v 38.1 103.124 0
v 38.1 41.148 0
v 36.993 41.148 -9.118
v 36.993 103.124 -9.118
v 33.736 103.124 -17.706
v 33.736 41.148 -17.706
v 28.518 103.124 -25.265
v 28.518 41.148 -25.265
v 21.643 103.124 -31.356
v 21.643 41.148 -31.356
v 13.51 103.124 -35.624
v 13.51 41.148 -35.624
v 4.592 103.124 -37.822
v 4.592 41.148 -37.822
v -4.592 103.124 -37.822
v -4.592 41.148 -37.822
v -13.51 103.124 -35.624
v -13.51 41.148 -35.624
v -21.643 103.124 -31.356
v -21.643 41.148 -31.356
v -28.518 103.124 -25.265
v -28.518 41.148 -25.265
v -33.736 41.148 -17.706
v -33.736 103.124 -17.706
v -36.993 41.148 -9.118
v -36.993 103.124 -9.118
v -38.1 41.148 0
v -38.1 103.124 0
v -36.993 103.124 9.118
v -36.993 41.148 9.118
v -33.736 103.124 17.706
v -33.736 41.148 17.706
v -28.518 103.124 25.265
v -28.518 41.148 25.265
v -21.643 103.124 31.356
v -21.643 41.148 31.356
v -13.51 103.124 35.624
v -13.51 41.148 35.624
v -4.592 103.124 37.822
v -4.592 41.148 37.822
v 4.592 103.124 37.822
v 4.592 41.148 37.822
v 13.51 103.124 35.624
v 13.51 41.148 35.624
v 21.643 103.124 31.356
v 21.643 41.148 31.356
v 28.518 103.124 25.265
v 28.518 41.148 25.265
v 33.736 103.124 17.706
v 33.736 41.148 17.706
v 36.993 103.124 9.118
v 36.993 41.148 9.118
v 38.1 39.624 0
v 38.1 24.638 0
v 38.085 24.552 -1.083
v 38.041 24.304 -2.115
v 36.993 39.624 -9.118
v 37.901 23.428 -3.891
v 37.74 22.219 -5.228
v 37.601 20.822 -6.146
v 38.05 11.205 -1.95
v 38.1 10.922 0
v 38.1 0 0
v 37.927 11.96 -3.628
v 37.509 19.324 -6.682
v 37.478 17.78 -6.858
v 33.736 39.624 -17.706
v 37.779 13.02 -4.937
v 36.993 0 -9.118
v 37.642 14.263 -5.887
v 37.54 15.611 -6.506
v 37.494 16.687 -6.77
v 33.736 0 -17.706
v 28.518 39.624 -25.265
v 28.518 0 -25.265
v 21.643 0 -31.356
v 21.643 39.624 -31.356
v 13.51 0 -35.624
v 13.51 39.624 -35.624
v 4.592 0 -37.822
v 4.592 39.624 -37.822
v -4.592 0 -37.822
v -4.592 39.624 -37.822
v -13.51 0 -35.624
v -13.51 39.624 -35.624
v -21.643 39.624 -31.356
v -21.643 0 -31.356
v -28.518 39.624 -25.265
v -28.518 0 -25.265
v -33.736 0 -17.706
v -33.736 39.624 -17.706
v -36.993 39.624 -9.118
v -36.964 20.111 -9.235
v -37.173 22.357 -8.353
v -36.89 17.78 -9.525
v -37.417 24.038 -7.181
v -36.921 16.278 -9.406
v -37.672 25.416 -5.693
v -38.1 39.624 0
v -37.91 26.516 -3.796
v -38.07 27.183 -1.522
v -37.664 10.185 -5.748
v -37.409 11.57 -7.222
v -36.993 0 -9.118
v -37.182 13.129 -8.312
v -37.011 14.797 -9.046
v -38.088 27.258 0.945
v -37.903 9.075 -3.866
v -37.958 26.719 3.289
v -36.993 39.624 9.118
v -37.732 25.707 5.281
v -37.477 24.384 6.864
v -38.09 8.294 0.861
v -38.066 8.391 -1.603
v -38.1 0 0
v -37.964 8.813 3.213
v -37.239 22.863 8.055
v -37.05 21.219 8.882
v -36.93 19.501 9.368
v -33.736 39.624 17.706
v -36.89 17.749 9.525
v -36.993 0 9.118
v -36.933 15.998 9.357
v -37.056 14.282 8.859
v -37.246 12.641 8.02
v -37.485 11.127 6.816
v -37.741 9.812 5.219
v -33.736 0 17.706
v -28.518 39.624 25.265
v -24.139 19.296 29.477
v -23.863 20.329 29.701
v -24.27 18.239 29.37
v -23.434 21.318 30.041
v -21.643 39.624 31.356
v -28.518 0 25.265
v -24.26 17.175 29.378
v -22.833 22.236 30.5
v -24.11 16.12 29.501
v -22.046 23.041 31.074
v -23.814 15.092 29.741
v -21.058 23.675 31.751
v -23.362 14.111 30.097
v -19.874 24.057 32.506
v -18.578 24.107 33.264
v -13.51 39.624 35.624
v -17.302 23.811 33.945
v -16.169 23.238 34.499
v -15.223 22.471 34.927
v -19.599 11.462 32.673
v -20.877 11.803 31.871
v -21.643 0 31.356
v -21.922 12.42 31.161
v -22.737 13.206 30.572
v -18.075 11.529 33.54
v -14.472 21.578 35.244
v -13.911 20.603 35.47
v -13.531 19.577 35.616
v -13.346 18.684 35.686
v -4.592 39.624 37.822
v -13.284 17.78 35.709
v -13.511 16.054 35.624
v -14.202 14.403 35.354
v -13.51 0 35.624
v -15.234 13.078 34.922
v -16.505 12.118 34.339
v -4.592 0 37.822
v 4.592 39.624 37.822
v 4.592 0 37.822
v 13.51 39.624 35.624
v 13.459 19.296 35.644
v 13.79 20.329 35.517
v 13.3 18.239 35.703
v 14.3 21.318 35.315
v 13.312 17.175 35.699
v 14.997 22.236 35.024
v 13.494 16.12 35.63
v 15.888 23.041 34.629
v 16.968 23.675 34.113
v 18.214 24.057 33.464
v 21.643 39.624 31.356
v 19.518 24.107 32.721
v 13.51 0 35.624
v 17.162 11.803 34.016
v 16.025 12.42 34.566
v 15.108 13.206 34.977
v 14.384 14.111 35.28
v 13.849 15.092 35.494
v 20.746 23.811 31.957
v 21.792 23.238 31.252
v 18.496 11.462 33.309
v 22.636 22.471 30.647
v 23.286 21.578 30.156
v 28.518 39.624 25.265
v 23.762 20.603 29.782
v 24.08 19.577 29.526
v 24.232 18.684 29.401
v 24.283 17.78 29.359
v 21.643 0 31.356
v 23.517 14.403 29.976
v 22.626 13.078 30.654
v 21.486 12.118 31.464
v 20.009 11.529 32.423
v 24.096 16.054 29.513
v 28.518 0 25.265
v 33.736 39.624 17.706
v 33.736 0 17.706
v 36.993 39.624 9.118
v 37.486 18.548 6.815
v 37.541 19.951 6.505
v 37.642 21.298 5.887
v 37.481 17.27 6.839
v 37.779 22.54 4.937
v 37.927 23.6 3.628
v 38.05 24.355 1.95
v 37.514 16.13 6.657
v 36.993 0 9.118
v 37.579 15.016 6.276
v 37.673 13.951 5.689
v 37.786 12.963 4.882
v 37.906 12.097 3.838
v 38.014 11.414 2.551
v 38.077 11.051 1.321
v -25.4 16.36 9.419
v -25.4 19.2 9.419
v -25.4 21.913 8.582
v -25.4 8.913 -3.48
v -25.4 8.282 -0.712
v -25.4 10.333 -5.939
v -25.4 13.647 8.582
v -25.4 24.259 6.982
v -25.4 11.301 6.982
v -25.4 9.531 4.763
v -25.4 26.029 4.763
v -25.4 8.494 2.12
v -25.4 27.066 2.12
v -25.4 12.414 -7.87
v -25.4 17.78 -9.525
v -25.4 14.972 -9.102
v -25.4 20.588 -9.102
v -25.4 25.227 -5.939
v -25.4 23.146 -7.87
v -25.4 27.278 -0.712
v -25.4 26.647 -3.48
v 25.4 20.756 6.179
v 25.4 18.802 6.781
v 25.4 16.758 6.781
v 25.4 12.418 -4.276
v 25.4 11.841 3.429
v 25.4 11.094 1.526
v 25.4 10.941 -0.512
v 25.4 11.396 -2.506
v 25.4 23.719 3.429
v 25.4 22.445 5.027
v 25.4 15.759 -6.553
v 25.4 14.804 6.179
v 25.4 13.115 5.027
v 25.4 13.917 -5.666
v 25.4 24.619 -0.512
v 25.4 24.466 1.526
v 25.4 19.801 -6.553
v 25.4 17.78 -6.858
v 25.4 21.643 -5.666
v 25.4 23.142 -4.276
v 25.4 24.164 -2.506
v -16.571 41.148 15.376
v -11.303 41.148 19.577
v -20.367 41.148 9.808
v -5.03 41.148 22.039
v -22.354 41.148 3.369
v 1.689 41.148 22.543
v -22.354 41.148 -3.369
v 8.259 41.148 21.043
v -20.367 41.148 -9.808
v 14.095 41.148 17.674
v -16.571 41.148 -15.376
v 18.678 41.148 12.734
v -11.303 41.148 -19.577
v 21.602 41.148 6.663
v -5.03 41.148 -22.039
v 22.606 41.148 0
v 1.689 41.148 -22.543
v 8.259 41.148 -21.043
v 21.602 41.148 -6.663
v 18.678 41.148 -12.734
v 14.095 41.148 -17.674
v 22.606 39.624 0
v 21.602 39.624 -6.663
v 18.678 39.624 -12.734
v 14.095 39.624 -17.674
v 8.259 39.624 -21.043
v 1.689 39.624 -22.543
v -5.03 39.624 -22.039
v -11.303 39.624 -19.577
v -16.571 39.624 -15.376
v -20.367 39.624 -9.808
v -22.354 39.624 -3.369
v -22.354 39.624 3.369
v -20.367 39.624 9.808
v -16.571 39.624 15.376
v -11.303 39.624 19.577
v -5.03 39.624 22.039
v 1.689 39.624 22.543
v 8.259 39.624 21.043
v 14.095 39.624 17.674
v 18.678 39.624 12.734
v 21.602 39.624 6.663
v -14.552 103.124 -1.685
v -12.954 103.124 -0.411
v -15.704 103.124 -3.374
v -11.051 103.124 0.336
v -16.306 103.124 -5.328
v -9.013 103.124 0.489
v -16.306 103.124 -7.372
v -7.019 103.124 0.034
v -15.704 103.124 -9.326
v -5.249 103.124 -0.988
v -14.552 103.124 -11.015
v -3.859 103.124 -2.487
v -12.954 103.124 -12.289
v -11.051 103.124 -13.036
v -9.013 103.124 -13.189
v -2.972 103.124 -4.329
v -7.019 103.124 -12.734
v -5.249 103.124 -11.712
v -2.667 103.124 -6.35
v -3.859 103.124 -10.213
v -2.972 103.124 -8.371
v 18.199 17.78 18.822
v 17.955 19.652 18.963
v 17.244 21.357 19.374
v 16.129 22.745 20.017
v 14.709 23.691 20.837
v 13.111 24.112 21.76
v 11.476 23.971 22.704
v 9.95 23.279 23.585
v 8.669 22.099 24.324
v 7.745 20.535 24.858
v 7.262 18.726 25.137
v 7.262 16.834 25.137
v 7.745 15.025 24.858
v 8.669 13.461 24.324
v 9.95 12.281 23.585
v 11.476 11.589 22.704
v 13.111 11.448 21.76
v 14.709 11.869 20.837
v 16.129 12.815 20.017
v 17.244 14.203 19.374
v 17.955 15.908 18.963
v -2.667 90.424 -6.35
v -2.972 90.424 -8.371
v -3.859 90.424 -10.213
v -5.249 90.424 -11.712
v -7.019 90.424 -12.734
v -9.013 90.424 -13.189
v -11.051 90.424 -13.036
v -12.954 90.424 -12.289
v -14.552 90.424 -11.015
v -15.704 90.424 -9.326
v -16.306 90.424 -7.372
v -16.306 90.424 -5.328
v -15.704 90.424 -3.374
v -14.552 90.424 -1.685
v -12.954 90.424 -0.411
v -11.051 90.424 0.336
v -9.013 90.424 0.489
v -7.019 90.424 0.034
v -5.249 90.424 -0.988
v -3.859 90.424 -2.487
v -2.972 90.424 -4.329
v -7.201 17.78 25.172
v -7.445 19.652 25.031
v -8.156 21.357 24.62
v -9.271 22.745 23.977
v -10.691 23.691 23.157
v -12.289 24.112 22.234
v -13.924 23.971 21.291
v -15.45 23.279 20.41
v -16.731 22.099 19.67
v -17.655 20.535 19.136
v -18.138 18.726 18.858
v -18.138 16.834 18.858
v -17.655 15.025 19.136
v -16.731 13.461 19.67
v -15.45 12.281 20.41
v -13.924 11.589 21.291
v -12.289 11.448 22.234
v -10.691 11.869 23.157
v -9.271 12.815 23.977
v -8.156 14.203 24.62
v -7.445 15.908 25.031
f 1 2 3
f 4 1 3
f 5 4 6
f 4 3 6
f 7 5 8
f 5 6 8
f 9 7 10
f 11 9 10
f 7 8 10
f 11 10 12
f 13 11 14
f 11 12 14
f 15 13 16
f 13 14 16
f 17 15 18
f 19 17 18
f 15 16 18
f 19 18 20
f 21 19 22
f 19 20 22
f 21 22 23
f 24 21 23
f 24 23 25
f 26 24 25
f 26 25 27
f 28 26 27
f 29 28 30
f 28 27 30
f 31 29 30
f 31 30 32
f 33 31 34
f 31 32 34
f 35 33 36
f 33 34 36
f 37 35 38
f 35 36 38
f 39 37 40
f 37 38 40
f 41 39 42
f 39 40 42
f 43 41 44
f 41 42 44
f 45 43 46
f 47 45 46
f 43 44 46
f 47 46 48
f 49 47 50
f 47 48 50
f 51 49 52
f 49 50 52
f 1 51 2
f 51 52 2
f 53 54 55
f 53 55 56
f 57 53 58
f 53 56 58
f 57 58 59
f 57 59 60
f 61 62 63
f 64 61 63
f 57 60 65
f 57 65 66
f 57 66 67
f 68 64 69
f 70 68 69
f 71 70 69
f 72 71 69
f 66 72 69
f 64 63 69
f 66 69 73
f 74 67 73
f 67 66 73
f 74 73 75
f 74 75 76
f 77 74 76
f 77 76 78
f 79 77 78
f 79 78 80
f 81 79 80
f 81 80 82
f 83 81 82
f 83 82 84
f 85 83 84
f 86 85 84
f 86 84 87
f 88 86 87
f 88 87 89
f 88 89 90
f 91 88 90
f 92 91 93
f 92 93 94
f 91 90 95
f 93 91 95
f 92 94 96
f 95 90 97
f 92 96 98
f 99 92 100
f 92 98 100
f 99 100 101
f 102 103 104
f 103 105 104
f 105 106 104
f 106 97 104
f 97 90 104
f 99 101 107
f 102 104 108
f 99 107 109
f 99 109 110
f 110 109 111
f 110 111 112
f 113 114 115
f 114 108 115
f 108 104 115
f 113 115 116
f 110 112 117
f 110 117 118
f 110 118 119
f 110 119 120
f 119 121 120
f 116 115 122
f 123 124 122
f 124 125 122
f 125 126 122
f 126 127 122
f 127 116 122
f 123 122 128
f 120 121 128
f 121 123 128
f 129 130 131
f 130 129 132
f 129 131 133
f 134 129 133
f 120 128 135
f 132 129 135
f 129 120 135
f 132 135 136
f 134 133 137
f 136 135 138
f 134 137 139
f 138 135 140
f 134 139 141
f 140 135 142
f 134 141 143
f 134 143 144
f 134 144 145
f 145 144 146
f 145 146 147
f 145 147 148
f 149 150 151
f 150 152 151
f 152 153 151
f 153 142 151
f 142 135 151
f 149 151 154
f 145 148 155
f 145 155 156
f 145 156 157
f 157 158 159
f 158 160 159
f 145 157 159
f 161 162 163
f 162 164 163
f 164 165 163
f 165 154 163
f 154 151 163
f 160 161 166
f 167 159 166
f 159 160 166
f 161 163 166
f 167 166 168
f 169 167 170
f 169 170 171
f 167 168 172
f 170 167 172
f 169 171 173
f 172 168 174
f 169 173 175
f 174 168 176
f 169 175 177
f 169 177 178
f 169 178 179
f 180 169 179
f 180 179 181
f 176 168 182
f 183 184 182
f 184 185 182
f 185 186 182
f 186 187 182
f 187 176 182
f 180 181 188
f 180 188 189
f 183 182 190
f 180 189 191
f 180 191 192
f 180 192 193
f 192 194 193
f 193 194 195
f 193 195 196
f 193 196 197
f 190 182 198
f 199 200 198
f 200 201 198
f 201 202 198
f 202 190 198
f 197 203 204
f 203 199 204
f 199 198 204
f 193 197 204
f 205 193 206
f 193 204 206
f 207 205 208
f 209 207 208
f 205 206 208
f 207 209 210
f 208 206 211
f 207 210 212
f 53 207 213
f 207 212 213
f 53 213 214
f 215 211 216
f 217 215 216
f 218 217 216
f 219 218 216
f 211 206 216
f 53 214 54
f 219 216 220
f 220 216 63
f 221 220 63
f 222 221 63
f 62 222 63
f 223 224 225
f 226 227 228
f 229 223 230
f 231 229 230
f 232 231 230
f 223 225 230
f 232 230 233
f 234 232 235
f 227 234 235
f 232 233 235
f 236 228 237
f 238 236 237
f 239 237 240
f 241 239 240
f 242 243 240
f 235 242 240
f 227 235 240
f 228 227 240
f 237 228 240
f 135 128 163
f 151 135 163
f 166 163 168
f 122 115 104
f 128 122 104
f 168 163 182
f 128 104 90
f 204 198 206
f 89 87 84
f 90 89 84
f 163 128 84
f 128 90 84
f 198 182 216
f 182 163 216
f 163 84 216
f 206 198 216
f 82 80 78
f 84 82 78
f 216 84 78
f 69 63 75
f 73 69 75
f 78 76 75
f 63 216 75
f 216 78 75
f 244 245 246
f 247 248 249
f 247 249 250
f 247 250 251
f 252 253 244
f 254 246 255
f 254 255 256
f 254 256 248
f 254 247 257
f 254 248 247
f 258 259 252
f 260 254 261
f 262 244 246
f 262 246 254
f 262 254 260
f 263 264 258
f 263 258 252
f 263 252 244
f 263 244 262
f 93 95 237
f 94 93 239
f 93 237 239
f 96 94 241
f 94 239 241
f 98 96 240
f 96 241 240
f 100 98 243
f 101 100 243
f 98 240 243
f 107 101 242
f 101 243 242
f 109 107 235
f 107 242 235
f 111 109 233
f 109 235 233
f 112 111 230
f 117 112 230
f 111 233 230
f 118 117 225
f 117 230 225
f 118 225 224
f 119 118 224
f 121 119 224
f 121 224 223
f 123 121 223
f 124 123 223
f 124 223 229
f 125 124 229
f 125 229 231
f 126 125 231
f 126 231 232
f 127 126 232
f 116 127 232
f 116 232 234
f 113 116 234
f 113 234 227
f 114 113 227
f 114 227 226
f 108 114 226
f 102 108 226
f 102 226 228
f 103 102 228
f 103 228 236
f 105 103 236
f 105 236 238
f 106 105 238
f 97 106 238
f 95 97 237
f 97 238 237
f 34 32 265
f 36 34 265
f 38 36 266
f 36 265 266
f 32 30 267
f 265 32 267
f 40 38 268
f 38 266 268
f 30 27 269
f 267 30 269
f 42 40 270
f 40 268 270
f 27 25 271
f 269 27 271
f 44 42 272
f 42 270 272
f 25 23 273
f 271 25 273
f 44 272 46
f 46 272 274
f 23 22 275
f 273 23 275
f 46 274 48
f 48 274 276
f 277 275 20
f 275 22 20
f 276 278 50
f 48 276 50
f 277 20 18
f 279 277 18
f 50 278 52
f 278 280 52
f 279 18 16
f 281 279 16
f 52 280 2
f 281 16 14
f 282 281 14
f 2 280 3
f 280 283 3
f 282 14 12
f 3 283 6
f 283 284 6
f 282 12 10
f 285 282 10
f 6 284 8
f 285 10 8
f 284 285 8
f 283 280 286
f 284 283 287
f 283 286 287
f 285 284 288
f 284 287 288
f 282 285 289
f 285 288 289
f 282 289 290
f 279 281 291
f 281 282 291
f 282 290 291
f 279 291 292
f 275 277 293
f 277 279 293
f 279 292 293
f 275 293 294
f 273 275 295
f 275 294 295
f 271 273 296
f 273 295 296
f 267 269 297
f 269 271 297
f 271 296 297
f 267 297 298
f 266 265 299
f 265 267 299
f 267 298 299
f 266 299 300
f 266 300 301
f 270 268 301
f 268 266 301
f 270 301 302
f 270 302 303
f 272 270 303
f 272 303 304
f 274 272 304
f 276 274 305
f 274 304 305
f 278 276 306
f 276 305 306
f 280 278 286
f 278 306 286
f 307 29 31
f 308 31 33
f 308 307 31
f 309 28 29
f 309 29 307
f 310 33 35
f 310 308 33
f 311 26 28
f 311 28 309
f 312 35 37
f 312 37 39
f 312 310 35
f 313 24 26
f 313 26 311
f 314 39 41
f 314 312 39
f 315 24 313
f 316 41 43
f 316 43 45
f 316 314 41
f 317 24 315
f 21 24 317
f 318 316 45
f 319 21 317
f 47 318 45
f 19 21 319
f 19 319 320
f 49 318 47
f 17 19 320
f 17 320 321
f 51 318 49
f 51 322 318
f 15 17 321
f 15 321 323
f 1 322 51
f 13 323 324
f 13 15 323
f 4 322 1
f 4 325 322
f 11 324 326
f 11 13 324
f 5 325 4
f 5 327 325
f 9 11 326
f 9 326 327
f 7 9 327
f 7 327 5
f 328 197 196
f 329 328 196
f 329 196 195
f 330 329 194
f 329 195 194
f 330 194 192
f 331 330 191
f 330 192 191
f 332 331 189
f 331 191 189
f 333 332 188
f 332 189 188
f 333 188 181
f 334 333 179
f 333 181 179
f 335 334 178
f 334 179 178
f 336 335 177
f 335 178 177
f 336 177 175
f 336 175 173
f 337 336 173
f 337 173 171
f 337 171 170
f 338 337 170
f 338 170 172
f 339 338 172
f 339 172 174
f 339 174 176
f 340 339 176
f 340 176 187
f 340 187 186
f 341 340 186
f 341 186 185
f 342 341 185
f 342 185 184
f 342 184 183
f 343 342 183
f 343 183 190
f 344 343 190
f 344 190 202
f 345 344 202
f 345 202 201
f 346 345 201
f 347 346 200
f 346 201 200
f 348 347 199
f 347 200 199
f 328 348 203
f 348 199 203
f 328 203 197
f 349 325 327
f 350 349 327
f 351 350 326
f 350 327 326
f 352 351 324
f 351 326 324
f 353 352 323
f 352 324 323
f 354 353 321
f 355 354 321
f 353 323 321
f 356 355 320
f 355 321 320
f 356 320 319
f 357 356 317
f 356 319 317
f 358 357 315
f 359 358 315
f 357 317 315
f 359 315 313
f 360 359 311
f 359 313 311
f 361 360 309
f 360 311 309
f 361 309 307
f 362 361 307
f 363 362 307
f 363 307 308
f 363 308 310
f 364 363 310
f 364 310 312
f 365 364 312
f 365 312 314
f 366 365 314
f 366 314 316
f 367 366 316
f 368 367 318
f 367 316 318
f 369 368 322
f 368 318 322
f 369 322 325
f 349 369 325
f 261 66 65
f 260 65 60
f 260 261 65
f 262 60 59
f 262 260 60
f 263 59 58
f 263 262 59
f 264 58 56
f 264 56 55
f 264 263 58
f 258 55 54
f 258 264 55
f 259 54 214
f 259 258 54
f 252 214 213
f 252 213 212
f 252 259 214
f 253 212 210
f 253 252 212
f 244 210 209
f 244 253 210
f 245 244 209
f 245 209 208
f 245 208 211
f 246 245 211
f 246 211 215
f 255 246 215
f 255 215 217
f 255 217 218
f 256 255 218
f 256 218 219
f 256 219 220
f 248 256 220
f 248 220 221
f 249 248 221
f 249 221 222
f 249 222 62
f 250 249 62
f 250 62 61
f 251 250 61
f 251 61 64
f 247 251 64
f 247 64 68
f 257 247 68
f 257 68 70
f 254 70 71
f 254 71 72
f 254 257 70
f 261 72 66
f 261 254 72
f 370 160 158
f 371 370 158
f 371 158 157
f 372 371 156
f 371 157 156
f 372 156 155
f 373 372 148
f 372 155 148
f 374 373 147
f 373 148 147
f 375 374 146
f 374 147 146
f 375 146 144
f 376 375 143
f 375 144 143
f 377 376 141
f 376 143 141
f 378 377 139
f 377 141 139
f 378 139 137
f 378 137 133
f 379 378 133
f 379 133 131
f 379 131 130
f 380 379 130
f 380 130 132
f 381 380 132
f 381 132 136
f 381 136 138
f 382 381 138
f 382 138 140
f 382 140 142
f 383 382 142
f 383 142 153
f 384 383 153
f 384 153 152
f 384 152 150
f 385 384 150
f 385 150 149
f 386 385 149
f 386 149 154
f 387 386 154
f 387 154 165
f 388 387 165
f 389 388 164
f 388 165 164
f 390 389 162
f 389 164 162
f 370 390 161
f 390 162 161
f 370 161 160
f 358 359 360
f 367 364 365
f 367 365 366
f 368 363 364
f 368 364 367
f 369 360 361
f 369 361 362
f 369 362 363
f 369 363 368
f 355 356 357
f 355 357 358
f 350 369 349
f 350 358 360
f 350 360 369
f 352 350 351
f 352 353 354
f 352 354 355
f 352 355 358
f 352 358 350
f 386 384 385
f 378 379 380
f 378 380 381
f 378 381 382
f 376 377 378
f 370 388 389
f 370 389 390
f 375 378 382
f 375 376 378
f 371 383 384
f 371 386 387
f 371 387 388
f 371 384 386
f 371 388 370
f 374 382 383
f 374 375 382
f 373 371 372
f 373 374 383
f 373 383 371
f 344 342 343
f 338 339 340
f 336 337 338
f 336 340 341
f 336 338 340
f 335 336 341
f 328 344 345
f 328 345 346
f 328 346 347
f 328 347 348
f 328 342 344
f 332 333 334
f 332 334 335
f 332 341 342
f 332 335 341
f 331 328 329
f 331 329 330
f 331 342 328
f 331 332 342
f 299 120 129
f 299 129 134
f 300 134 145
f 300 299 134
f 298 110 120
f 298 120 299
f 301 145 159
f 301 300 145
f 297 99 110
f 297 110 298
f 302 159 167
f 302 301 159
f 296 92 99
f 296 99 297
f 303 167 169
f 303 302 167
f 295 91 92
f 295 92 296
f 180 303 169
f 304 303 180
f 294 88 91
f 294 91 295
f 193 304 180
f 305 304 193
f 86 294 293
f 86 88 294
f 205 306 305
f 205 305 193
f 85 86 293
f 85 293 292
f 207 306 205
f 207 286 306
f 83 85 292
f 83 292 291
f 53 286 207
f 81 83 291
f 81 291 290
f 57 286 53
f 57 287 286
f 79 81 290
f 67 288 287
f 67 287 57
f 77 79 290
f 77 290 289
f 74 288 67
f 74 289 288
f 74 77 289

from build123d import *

# Parameters (mm, degrees)
SKETCH1_R           = 38.1
BOSS_EXTRUDE1_DEPTH = 39.624
SKETCH2_R           = 22.606
BOSS_EXTRUDE2_DEPTH = 12.7
SKETCH3_R           = 38.1
BOSS_EXTRUDE3_DEPTH = 61.976
CUT_EXTRUDE1_START  = 25.4
SKETCH4_R           = 6.858
CUT_EXTRUDE1_DEPTH  = 12.7
CUT_EXTRUDE2_START  = -25.4
SKETCH5_R           = 9.525
CUT_EXTRUDE2_DEPTH  = 12.7
SKETCH7_R           = 6.35
CUT_EXTRUDE3_DEPTH  = 12.7
SKETCH8_R           = 6.35
CUT_EXTRUDE5_DEPTH  = 12.7
SKETCH9_R           = 6.858
CUT_EXTRUDE6_DEPTH  = 12.7


with BuildPart() as part:
    # Sketch1 → Boss-Extrude1 (new body)
    with BuildSketch(Plane(origin=(0, 0, 0), x_dir=(1, 0, 0), z_dir=(0, 1, 0))):
        Circle(SKETCH1_R)
    extrude(amount=BOSS_EXTRUDE1_DEPTH)

    # Sketch2 → Boss-Extrude2 (add)
    with BuildSketch(Plane(origin=(0, 39.624, 0), x_dir=(1, 0, 0), z_dir=(0, 1, 0))):
        Circle(SKETCH2_R)
    extrude(amount=BOSS_EXTRUDE2_DEPTH)

    # Sketch3 → Boss-Extrude3 (add)
    with BuildSketch(Plane(origin=(0, 41.148, 0), x_dir=(1, 0, 0), z_dir=(0, 1, 0))):
        Circle(SKETCH3_R)
    extrude(amount=BOSS_EXTRUDE3_DEPTH)

    # Sketch4 → Cut-Extrude1 (cut)
    with BuildSketch(Plane(origin=(0, 0, 0), x_dir=(0, 0, -1), z_dir=(1, 0, 0)).offset(CUT_EXTRUDE1_START)):
        with Locations((0, 17.78)):
            Circle(SKETCH4_R)
    extrude(amount=CUT_EXTRUDE1_DEPTH, mode=Mode.SUBTRACT)

    # Sketch5 → Cut-Extrude2 (cut)
    with BuildSketch(Plane(origin=(0, 0, 0), x_dir=(0, 0, -1), z_dir=(1, 0, 0)).offset(CUT_EXTRUDE2_START)):
        with Locations((0, 17.78)):
            Circle(SKETCH5_R)
    extrude(amount=-CUT_EXTRUDE2_DEPTH, mode=Mode.SUBTRACT)

    # Sketch7 → Cut-Extrude3 (cut)
    with BuildSketch(Plane(origin=(-19.05, 0, 32.995567884), x_dir=(0.866025404, 0, 0.5), z_dir=(-0.5, 0, 0.866025404))):
        with Locations((0, 17.78)):
            Circle(SKETCH7_R)
    extrude(amount=-CUT_EXTRUDE3_DEPTH, mode=Mode.SUBTRACT)

    # Sketch8 → Cut-Extrude5 (cut)
    with BuildSketch(Plane(origin=(19.05, 0, 32.995567884), x_dir=(0.866025404, 0, -0.5), z_dir=(0.5, 0, 0.866025404))):
        with Locations((0, 17.78)):
            Circle(SKETCH8_R)
    extrude(amount=-CUT_EXTRUDE5_DEPTH, mode=Mode.SUBTRACT)

    # Sketch9 → Cut-Extrude6 (cut)
    with BuildSketch(Plane(origin=(0, 103.124, 0), x_dir=(1, 0, 0), z_dir=(0, 1, 0))):
        with Locations((-9.525, 6.35)):
            Circle(SKETCH9_R)
    extrude(amount=-CUT_EXTRUDE6_DEPTH, mode=Mode.SUBTRACT)


solid = part.part
